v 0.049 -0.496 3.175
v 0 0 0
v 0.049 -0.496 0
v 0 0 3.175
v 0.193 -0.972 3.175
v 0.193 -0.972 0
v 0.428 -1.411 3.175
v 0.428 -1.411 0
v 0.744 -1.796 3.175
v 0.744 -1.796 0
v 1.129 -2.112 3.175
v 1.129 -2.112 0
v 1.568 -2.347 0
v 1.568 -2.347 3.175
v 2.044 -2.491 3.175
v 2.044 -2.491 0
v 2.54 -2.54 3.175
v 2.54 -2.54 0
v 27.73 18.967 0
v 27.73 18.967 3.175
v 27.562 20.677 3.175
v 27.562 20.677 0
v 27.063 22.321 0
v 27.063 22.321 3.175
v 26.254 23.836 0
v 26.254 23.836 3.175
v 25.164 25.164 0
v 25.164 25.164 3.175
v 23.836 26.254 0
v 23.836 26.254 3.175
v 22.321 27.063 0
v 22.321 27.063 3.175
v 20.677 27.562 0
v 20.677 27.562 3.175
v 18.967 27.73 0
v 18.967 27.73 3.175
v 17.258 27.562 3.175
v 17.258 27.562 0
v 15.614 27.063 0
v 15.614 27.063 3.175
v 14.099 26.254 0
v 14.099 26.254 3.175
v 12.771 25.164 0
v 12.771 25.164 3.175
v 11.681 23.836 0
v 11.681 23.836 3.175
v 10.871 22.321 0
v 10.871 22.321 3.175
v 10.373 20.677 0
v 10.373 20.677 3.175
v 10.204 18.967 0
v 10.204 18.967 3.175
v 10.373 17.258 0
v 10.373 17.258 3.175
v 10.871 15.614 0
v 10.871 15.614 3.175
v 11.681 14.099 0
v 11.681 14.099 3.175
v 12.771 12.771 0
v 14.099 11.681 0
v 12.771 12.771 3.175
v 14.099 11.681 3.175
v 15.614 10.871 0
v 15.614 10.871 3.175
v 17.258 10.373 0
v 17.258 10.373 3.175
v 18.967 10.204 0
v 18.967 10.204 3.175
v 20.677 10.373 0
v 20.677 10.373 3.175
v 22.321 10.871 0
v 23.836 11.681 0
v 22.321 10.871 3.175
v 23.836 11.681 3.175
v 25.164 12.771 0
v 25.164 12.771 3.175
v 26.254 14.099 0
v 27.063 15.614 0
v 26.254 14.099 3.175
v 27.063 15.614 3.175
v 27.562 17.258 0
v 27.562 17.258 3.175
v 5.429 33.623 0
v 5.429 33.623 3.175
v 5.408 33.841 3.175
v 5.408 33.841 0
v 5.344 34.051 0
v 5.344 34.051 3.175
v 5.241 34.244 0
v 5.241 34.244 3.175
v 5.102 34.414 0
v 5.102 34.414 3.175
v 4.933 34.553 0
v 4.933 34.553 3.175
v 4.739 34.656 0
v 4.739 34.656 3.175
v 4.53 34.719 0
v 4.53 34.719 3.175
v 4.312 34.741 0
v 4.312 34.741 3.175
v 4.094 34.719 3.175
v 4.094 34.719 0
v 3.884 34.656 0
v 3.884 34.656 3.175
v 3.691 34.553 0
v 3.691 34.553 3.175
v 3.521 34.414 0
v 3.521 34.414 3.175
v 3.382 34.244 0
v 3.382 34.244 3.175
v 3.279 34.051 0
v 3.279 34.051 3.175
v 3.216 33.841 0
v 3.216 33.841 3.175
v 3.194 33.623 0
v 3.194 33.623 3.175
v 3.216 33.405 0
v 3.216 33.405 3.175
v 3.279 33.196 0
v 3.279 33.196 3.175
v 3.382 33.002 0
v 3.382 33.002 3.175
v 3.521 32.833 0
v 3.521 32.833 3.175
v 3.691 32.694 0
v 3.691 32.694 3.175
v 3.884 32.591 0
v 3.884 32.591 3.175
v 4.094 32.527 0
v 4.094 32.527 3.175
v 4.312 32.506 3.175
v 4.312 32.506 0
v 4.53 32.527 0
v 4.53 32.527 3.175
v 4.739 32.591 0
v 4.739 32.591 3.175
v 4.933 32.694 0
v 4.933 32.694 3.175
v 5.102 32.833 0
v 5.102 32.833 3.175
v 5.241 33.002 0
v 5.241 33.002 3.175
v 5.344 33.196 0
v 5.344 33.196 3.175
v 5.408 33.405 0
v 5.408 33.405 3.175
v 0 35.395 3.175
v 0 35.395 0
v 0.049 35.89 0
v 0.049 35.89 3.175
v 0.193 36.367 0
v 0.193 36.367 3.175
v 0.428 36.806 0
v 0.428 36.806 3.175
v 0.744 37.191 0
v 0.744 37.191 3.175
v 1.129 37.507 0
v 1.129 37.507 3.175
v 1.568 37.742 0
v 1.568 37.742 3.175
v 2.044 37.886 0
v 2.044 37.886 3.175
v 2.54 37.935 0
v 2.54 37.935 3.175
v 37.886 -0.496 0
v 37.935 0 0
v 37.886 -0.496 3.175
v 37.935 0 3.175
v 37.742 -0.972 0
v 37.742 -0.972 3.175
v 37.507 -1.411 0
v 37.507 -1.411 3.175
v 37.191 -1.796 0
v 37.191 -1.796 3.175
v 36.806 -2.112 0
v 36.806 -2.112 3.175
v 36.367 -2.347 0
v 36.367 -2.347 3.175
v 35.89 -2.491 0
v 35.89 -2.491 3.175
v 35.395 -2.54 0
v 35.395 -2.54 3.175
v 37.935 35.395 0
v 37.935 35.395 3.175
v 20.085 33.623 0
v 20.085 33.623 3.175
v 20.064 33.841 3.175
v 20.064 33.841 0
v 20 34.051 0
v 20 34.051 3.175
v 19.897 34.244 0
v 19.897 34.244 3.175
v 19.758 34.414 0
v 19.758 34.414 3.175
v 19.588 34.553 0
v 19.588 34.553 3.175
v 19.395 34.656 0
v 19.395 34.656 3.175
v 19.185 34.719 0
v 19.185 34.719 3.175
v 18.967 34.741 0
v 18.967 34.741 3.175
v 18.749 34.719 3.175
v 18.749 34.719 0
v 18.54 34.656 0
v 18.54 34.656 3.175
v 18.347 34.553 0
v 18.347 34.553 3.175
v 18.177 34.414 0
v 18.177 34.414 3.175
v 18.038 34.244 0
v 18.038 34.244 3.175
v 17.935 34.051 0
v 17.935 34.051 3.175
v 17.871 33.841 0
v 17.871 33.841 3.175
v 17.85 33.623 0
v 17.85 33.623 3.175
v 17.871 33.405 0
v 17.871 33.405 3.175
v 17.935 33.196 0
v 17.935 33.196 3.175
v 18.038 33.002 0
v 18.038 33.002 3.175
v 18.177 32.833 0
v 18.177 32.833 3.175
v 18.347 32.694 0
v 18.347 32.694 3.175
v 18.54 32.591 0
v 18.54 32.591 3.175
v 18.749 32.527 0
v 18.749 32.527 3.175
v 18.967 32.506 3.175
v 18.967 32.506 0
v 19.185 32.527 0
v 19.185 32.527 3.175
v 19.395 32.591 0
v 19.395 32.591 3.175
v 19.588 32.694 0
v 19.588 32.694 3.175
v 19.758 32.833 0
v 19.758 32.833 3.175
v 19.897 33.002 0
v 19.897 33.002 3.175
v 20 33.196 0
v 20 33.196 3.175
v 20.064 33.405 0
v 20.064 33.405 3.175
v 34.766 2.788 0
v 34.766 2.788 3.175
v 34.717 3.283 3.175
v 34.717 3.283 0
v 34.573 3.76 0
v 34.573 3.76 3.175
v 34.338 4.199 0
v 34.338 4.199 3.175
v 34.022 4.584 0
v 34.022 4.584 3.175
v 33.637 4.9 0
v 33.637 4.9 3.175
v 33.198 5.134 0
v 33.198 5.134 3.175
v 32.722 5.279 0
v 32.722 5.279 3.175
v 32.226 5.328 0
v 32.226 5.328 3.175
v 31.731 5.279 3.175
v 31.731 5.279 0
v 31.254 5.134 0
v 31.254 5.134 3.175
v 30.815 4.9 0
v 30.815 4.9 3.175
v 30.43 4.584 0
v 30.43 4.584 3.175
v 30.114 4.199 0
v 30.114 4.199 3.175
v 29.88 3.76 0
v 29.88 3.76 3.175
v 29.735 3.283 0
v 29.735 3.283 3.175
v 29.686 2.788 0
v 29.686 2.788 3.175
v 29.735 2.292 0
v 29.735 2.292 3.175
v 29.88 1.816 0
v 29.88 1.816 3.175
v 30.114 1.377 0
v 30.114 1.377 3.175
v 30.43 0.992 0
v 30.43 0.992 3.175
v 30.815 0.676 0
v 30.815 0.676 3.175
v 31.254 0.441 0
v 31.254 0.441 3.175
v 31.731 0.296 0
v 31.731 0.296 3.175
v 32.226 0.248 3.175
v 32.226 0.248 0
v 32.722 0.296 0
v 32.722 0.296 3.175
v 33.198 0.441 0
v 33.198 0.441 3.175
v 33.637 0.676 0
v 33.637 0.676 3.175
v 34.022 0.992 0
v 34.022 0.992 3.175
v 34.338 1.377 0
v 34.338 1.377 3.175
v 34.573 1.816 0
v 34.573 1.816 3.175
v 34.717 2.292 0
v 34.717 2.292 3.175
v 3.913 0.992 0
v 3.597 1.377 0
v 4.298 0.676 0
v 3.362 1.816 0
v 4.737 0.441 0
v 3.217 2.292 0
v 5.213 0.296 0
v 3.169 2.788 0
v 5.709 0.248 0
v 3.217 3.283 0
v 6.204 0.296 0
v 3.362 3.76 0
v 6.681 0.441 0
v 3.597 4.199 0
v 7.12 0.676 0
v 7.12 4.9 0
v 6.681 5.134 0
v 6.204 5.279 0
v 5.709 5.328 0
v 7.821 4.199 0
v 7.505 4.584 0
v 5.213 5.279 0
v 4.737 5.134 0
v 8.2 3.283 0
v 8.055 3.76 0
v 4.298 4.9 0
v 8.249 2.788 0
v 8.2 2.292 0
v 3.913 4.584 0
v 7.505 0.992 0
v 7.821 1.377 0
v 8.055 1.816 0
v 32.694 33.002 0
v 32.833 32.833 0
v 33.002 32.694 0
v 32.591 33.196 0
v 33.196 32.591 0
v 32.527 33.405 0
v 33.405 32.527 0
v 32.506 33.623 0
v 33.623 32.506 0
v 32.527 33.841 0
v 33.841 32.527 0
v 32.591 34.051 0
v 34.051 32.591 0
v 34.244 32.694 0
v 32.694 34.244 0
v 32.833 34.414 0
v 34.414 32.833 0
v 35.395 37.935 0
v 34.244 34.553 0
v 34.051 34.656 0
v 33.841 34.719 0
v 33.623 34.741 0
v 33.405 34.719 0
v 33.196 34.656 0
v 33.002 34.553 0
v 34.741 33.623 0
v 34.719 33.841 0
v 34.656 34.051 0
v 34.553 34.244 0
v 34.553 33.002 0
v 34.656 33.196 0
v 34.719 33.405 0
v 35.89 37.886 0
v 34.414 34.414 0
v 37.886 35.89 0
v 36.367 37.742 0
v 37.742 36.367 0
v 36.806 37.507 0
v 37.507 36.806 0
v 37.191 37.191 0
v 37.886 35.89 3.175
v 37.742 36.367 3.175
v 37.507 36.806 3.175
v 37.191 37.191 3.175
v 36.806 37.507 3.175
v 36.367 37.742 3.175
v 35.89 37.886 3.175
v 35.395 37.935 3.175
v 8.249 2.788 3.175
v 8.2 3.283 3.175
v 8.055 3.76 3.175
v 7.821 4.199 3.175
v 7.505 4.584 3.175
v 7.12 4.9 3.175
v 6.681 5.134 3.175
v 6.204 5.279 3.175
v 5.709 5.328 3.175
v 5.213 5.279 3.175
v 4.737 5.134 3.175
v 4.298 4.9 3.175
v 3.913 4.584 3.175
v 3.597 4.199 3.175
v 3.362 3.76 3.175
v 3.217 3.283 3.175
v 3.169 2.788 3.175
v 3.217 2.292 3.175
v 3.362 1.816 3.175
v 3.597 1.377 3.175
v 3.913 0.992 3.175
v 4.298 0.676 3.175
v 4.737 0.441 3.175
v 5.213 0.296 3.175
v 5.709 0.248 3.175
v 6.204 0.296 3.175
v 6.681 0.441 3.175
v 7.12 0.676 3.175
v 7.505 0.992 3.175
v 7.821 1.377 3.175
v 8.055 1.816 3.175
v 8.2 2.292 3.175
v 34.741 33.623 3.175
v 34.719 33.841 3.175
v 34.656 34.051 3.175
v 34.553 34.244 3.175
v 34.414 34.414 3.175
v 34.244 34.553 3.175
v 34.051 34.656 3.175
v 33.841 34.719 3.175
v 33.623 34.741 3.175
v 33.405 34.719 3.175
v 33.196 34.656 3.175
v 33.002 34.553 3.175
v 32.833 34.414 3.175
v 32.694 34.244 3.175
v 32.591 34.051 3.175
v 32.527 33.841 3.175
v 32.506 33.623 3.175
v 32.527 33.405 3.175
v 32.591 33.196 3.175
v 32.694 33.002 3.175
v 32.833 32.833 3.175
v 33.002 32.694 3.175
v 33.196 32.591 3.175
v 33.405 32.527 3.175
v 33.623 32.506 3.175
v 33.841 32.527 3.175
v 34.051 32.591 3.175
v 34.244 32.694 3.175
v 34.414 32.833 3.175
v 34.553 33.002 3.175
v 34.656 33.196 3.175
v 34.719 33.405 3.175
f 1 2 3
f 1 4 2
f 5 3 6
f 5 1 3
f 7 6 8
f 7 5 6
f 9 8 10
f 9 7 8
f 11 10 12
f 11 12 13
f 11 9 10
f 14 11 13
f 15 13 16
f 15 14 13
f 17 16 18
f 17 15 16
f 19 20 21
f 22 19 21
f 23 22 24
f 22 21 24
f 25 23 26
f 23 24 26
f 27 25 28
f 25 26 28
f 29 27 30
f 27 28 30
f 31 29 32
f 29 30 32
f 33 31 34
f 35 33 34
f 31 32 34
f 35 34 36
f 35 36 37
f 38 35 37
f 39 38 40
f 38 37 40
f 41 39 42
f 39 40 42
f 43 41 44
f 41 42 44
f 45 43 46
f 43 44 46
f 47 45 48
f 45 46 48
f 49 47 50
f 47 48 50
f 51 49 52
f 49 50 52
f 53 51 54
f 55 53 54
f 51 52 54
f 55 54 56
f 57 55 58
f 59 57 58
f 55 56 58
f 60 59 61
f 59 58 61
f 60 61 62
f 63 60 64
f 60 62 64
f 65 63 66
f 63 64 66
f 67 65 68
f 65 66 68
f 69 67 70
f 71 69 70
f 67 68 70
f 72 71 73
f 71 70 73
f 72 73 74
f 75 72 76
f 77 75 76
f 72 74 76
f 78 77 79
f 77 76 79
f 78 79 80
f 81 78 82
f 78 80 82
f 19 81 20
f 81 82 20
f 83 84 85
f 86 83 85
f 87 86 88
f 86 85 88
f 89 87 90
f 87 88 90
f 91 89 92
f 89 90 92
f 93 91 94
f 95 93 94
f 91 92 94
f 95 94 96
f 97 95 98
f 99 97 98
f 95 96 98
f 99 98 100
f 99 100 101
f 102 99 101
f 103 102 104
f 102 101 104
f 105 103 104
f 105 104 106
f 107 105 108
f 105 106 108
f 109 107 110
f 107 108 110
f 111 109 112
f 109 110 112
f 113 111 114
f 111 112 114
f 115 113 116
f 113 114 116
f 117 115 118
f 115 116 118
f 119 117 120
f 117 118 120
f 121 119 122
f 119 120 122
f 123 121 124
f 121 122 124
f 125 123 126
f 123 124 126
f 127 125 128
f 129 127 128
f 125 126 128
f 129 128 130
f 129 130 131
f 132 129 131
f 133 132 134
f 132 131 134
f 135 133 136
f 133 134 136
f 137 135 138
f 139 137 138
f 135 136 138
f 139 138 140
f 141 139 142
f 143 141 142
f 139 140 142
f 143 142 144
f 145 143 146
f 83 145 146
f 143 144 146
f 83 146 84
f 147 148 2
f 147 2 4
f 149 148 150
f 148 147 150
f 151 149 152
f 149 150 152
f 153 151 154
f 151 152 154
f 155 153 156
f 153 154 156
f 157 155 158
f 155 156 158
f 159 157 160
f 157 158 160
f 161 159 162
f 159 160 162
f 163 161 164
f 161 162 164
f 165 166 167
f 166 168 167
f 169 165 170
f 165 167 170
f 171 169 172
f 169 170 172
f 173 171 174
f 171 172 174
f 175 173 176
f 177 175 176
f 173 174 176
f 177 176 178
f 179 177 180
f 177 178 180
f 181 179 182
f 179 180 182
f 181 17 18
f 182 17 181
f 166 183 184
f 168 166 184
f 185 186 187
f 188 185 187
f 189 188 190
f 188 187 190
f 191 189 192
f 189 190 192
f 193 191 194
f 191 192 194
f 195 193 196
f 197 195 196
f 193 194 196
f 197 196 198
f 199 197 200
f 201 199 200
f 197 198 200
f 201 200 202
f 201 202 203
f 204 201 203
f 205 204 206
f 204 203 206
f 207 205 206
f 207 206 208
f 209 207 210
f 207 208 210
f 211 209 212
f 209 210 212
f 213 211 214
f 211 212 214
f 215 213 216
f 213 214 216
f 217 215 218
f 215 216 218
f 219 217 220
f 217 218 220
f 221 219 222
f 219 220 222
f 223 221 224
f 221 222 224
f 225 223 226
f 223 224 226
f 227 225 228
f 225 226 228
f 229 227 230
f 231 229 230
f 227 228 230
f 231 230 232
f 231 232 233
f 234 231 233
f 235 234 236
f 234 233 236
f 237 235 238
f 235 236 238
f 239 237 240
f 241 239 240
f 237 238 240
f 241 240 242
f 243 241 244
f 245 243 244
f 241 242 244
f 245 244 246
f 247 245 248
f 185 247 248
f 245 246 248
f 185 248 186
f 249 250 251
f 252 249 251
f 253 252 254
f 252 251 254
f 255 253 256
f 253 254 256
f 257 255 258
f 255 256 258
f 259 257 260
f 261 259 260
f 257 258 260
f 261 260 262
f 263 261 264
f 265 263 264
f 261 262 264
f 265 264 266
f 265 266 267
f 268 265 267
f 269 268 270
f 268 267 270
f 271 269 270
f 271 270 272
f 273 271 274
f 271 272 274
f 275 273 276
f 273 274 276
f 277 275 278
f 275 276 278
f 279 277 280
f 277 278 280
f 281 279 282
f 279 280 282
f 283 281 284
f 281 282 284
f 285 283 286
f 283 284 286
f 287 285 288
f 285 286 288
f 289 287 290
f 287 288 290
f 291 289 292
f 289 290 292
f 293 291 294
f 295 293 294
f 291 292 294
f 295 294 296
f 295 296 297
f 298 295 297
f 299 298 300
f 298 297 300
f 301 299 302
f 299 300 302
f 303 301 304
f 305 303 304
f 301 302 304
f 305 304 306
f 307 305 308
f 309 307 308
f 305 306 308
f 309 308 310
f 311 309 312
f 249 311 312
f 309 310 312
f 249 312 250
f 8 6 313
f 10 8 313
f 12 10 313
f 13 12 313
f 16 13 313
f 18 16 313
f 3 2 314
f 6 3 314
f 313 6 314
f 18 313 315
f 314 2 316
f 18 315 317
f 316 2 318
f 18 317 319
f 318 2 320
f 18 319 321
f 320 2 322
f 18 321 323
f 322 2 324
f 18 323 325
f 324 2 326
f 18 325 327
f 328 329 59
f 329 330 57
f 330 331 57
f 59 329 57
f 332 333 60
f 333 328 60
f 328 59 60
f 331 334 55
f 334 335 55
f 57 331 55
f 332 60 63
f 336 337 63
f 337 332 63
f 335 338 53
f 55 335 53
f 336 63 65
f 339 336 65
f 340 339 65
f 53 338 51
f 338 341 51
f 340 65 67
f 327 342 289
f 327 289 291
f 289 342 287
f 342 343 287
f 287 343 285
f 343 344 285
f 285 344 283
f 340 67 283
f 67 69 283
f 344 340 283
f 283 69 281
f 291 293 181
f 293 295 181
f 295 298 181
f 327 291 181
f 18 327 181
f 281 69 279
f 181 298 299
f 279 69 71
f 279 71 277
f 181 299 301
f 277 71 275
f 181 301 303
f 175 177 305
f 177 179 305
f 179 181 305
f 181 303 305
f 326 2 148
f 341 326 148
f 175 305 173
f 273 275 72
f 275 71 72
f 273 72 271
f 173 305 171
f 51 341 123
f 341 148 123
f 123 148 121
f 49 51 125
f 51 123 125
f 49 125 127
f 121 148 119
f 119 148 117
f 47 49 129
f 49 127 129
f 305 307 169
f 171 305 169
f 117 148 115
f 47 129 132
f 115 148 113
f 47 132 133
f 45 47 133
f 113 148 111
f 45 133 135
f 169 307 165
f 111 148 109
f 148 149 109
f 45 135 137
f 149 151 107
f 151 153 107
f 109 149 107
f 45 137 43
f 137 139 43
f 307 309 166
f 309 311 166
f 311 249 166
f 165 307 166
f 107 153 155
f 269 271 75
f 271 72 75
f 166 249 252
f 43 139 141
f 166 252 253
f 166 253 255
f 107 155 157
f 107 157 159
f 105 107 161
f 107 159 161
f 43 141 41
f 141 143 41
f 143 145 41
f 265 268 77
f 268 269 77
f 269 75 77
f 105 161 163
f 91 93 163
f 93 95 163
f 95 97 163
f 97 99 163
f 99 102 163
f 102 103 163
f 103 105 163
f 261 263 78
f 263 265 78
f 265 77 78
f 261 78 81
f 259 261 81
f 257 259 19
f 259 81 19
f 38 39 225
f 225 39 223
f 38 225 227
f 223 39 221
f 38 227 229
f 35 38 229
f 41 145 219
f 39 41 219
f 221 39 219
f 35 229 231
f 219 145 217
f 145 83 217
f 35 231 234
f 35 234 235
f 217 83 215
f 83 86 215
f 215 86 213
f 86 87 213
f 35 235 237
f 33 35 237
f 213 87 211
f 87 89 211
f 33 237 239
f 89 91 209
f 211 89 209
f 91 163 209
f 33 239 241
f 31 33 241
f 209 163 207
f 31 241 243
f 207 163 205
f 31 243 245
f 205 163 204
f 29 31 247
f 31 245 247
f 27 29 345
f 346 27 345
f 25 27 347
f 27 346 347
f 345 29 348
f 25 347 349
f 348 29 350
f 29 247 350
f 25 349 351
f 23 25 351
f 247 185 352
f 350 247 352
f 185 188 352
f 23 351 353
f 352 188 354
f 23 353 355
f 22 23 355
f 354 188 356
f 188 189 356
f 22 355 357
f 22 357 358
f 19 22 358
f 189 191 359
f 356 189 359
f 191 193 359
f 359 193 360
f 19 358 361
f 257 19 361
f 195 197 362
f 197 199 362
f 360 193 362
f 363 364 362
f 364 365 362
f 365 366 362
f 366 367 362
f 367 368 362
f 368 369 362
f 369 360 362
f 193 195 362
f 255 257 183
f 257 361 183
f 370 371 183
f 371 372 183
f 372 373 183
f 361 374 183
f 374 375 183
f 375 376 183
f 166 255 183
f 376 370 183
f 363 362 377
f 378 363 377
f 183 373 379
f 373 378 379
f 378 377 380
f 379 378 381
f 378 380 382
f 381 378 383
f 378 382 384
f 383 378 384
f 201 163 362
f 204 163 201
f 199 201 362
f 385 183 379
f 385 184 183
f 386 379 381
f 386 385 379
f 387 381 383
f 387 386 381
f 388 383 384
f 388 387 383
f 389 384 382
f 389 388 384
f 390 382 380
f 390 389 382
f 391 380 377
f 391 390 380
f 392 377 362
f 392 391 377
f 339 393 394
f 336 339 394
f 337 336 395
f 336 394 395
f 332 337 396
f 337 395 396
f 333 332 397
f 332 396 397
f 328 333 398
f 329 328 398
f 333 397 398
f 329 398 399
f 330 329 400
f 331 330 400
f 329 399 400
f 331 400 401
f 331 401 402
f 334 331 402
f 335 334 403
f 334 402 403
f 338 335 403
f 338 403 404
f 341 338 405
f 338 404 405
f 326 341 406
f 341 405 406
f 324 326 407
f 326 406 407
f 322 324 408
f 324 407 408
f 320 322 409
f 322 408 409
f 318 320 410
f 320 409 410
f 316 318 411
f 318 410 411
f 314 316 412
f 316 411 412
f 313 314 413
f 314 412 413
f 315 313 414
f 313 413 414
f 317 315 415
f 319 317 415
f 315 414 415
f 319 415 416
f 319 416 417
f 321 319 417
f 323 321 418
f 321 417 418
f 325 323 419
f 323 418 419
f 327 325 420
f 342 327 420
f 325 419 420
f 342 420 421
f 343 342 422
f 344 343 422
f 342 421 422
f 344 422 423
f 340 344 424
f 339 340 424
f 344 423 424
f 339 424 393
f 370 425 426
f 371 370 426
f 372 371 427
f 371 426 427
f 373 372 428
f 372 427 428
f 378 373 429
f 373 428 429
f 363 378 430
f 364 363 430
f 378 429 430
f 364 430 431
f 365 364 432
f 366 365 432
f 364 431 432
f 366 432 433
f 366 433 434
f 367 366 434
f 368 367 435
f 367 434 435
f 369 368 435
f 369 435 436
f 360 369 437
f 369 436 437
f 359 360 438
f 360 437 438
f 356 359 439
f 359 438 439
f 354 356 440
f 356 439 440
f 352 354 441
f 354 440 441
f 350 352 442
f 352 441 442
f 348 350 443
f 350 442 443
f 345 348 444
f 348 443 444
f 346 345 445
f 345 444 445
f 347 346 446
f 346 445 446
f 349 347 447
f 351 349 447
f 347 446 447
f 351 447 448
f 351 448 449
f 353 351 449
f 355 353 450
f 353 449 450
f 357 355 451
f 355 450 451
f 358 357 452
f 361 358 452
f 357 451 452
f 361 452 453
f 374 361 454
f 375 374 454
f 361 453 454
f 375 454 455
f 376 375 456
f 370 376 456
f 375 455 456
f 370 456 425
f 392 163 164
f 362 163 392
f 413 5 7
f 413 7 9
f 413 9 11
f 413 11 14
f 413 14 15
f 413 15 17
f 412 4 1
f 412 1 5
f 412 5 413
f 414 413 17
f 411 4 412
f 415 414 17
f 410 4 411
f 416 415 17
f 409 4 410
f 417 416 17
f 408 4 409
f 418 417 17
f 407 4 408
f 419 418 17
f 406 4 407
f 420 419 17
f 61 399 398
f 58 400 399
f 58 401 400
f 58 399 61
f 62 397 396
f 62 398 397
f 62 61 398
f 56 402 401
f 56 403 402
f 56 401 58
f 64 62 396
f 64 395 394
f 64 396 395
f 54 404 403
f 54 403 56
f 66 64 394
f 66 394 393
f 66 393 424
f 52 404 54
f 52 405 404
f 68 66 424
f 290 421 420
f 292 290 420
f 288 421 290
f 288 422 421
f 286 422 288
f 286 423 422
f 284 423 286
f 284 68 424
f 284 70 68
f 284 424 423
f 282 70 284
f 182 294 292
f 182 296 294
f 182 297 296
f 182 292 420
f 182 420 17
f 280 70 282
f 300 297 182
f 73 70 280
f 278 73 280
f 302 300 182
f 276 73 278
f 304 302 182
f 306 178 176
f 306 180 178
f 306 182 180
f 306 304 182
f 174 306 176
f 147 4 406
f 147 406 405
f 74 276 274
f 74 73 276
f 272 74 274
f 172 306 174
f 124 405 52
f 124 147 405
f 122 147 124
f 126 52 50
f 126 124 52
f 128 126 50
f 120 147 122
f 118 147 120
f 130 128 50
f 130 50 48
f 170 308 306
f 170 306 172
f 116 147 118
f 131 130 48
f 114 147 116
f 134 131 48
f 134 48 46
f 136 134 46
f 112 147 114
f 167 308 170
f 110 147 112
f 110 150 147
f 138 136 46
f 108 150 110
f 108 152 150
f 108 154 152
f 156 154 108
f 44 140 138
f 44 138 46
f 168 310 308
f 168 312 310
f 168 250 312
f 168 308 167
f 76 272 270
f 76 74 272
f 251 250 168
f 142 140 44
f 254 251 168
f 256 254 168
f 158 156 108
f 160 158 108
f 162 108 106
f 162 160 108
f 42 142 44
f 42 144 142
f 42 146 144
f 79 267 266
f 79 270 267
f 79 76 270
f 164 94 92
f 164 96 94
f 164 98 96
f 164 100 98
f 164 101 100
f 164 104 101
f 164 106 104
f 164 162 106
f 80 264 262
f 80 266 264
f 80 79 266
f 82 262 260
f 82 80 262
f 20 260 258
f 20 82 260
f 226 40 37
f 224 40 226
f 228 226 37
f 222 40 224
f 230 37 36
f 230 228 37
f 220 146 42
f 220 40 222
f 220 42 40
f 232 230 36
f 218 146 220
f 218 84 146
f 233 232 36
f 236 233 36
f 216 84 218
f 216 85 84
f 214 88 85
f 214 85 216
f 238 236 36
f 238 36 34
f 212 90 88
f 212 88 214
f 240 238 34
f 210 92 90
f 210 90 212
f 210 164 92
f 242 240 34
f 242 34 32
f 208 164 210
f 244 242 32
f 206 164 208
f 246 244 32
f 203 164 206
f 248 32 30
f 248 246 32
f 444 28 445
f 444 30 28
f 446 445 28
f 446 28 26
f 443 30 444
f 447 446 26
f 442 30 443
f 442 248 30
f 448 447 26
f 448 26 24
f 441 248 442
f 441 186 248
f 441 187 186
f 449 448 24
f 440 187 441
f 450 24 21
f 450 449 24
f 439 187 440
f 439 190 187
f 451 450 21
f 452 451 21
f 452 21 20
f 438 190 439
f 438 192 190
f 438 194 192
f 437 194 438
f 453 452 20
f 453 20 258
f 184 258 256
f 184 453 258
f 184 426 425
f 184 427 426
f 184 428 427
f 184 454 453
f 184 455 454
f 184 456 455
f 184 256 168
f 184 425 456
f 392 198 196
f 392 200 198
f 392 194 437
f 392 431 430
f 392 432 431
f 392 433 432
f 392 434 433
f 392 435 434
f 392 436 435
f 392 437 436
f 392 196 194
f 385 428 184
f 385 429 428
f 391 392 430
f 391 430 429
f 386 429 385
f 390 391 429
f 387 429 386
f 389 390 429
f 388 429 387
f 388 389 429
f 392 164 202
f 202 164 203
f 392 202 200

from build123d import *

# Parameters (mm, degrees)
SKETCH1_W           = 37.9349
SKETCH1_H           = 37.9349
BOSS_EXTRUDE1_DEPTH = 3.175
SKETCH9_R           = 1.1176
SKETCH9_R_2         = 2.54
SKETCH9_R_3         = 8.763
CUT_EXTRUDE2_DEPTH  = 3.175
SKETCH11_W          = 37.9349
SKETCH11_H          = 3.175
BOSS_EXTRUDE2_DEPTH = 2.54
FILLET1_R           = 2.54


with BuildPart() as part:
    # Sketch1 → Boss-Extrude1 (new body)
    with BuildSketch(Plane.XY):
        with Locations((18.96745, 18.96745)):
            Rectangle(SKETCH1_W, SKETCH1_H)
    extrude(amount=BOSS_EXTRUDE1_DEPTH)

    # Sketch9 → Cut-Extrude2 (cut)
    with BuildSketch(Plane.XY.offset(3.175)):
        with Locations((33.62325, 33.62325)):
            Circle(SKETCH9_R)
        with Locations((4.31165, 33.62325)):
            Circle(SKETCH9_R)
        with Locations((5.70865, 2.78765)):
            Circle(SKETCH9_R_2)
        with Locations((32.22625, 2.78765)):
            Circle(SKETCH9_R_2)
        with Locations((18.96745, 33.62325)):
            Circle(SKETCH9_R)
        with Locations((18.96745, 18.96745)):
            Circle(SKETCH9_R_3)
    extrude(amount=-CUT_EXTRUDE2_DEPTH, mode=Mode.SUBTRACT)

    # Sketch11 → Boss-Extrude2 (add)
    with BuildSketch(Plane.XZ):
        with Locations((18.96745, 1.5875)):
            Rectangle(SKETCH11_W, SKETCH11_H)
    extrude(amount=BOSS_EXTRUDE2_DEPTH)

    # Fillet1
    fillet1_edges = [part.edges().sort_by_distance(p)[0] for p in [
        (0, -2.54, 1.5875),
        (37.9349, -2.54, 1.5875),
        (0, 37.9349, 1.5875),
        (37.9349, 37.9349, 1.5875),
    ]]
    fillet(fillet1_edges, radius=FILLET1_R)


solid = part.part
